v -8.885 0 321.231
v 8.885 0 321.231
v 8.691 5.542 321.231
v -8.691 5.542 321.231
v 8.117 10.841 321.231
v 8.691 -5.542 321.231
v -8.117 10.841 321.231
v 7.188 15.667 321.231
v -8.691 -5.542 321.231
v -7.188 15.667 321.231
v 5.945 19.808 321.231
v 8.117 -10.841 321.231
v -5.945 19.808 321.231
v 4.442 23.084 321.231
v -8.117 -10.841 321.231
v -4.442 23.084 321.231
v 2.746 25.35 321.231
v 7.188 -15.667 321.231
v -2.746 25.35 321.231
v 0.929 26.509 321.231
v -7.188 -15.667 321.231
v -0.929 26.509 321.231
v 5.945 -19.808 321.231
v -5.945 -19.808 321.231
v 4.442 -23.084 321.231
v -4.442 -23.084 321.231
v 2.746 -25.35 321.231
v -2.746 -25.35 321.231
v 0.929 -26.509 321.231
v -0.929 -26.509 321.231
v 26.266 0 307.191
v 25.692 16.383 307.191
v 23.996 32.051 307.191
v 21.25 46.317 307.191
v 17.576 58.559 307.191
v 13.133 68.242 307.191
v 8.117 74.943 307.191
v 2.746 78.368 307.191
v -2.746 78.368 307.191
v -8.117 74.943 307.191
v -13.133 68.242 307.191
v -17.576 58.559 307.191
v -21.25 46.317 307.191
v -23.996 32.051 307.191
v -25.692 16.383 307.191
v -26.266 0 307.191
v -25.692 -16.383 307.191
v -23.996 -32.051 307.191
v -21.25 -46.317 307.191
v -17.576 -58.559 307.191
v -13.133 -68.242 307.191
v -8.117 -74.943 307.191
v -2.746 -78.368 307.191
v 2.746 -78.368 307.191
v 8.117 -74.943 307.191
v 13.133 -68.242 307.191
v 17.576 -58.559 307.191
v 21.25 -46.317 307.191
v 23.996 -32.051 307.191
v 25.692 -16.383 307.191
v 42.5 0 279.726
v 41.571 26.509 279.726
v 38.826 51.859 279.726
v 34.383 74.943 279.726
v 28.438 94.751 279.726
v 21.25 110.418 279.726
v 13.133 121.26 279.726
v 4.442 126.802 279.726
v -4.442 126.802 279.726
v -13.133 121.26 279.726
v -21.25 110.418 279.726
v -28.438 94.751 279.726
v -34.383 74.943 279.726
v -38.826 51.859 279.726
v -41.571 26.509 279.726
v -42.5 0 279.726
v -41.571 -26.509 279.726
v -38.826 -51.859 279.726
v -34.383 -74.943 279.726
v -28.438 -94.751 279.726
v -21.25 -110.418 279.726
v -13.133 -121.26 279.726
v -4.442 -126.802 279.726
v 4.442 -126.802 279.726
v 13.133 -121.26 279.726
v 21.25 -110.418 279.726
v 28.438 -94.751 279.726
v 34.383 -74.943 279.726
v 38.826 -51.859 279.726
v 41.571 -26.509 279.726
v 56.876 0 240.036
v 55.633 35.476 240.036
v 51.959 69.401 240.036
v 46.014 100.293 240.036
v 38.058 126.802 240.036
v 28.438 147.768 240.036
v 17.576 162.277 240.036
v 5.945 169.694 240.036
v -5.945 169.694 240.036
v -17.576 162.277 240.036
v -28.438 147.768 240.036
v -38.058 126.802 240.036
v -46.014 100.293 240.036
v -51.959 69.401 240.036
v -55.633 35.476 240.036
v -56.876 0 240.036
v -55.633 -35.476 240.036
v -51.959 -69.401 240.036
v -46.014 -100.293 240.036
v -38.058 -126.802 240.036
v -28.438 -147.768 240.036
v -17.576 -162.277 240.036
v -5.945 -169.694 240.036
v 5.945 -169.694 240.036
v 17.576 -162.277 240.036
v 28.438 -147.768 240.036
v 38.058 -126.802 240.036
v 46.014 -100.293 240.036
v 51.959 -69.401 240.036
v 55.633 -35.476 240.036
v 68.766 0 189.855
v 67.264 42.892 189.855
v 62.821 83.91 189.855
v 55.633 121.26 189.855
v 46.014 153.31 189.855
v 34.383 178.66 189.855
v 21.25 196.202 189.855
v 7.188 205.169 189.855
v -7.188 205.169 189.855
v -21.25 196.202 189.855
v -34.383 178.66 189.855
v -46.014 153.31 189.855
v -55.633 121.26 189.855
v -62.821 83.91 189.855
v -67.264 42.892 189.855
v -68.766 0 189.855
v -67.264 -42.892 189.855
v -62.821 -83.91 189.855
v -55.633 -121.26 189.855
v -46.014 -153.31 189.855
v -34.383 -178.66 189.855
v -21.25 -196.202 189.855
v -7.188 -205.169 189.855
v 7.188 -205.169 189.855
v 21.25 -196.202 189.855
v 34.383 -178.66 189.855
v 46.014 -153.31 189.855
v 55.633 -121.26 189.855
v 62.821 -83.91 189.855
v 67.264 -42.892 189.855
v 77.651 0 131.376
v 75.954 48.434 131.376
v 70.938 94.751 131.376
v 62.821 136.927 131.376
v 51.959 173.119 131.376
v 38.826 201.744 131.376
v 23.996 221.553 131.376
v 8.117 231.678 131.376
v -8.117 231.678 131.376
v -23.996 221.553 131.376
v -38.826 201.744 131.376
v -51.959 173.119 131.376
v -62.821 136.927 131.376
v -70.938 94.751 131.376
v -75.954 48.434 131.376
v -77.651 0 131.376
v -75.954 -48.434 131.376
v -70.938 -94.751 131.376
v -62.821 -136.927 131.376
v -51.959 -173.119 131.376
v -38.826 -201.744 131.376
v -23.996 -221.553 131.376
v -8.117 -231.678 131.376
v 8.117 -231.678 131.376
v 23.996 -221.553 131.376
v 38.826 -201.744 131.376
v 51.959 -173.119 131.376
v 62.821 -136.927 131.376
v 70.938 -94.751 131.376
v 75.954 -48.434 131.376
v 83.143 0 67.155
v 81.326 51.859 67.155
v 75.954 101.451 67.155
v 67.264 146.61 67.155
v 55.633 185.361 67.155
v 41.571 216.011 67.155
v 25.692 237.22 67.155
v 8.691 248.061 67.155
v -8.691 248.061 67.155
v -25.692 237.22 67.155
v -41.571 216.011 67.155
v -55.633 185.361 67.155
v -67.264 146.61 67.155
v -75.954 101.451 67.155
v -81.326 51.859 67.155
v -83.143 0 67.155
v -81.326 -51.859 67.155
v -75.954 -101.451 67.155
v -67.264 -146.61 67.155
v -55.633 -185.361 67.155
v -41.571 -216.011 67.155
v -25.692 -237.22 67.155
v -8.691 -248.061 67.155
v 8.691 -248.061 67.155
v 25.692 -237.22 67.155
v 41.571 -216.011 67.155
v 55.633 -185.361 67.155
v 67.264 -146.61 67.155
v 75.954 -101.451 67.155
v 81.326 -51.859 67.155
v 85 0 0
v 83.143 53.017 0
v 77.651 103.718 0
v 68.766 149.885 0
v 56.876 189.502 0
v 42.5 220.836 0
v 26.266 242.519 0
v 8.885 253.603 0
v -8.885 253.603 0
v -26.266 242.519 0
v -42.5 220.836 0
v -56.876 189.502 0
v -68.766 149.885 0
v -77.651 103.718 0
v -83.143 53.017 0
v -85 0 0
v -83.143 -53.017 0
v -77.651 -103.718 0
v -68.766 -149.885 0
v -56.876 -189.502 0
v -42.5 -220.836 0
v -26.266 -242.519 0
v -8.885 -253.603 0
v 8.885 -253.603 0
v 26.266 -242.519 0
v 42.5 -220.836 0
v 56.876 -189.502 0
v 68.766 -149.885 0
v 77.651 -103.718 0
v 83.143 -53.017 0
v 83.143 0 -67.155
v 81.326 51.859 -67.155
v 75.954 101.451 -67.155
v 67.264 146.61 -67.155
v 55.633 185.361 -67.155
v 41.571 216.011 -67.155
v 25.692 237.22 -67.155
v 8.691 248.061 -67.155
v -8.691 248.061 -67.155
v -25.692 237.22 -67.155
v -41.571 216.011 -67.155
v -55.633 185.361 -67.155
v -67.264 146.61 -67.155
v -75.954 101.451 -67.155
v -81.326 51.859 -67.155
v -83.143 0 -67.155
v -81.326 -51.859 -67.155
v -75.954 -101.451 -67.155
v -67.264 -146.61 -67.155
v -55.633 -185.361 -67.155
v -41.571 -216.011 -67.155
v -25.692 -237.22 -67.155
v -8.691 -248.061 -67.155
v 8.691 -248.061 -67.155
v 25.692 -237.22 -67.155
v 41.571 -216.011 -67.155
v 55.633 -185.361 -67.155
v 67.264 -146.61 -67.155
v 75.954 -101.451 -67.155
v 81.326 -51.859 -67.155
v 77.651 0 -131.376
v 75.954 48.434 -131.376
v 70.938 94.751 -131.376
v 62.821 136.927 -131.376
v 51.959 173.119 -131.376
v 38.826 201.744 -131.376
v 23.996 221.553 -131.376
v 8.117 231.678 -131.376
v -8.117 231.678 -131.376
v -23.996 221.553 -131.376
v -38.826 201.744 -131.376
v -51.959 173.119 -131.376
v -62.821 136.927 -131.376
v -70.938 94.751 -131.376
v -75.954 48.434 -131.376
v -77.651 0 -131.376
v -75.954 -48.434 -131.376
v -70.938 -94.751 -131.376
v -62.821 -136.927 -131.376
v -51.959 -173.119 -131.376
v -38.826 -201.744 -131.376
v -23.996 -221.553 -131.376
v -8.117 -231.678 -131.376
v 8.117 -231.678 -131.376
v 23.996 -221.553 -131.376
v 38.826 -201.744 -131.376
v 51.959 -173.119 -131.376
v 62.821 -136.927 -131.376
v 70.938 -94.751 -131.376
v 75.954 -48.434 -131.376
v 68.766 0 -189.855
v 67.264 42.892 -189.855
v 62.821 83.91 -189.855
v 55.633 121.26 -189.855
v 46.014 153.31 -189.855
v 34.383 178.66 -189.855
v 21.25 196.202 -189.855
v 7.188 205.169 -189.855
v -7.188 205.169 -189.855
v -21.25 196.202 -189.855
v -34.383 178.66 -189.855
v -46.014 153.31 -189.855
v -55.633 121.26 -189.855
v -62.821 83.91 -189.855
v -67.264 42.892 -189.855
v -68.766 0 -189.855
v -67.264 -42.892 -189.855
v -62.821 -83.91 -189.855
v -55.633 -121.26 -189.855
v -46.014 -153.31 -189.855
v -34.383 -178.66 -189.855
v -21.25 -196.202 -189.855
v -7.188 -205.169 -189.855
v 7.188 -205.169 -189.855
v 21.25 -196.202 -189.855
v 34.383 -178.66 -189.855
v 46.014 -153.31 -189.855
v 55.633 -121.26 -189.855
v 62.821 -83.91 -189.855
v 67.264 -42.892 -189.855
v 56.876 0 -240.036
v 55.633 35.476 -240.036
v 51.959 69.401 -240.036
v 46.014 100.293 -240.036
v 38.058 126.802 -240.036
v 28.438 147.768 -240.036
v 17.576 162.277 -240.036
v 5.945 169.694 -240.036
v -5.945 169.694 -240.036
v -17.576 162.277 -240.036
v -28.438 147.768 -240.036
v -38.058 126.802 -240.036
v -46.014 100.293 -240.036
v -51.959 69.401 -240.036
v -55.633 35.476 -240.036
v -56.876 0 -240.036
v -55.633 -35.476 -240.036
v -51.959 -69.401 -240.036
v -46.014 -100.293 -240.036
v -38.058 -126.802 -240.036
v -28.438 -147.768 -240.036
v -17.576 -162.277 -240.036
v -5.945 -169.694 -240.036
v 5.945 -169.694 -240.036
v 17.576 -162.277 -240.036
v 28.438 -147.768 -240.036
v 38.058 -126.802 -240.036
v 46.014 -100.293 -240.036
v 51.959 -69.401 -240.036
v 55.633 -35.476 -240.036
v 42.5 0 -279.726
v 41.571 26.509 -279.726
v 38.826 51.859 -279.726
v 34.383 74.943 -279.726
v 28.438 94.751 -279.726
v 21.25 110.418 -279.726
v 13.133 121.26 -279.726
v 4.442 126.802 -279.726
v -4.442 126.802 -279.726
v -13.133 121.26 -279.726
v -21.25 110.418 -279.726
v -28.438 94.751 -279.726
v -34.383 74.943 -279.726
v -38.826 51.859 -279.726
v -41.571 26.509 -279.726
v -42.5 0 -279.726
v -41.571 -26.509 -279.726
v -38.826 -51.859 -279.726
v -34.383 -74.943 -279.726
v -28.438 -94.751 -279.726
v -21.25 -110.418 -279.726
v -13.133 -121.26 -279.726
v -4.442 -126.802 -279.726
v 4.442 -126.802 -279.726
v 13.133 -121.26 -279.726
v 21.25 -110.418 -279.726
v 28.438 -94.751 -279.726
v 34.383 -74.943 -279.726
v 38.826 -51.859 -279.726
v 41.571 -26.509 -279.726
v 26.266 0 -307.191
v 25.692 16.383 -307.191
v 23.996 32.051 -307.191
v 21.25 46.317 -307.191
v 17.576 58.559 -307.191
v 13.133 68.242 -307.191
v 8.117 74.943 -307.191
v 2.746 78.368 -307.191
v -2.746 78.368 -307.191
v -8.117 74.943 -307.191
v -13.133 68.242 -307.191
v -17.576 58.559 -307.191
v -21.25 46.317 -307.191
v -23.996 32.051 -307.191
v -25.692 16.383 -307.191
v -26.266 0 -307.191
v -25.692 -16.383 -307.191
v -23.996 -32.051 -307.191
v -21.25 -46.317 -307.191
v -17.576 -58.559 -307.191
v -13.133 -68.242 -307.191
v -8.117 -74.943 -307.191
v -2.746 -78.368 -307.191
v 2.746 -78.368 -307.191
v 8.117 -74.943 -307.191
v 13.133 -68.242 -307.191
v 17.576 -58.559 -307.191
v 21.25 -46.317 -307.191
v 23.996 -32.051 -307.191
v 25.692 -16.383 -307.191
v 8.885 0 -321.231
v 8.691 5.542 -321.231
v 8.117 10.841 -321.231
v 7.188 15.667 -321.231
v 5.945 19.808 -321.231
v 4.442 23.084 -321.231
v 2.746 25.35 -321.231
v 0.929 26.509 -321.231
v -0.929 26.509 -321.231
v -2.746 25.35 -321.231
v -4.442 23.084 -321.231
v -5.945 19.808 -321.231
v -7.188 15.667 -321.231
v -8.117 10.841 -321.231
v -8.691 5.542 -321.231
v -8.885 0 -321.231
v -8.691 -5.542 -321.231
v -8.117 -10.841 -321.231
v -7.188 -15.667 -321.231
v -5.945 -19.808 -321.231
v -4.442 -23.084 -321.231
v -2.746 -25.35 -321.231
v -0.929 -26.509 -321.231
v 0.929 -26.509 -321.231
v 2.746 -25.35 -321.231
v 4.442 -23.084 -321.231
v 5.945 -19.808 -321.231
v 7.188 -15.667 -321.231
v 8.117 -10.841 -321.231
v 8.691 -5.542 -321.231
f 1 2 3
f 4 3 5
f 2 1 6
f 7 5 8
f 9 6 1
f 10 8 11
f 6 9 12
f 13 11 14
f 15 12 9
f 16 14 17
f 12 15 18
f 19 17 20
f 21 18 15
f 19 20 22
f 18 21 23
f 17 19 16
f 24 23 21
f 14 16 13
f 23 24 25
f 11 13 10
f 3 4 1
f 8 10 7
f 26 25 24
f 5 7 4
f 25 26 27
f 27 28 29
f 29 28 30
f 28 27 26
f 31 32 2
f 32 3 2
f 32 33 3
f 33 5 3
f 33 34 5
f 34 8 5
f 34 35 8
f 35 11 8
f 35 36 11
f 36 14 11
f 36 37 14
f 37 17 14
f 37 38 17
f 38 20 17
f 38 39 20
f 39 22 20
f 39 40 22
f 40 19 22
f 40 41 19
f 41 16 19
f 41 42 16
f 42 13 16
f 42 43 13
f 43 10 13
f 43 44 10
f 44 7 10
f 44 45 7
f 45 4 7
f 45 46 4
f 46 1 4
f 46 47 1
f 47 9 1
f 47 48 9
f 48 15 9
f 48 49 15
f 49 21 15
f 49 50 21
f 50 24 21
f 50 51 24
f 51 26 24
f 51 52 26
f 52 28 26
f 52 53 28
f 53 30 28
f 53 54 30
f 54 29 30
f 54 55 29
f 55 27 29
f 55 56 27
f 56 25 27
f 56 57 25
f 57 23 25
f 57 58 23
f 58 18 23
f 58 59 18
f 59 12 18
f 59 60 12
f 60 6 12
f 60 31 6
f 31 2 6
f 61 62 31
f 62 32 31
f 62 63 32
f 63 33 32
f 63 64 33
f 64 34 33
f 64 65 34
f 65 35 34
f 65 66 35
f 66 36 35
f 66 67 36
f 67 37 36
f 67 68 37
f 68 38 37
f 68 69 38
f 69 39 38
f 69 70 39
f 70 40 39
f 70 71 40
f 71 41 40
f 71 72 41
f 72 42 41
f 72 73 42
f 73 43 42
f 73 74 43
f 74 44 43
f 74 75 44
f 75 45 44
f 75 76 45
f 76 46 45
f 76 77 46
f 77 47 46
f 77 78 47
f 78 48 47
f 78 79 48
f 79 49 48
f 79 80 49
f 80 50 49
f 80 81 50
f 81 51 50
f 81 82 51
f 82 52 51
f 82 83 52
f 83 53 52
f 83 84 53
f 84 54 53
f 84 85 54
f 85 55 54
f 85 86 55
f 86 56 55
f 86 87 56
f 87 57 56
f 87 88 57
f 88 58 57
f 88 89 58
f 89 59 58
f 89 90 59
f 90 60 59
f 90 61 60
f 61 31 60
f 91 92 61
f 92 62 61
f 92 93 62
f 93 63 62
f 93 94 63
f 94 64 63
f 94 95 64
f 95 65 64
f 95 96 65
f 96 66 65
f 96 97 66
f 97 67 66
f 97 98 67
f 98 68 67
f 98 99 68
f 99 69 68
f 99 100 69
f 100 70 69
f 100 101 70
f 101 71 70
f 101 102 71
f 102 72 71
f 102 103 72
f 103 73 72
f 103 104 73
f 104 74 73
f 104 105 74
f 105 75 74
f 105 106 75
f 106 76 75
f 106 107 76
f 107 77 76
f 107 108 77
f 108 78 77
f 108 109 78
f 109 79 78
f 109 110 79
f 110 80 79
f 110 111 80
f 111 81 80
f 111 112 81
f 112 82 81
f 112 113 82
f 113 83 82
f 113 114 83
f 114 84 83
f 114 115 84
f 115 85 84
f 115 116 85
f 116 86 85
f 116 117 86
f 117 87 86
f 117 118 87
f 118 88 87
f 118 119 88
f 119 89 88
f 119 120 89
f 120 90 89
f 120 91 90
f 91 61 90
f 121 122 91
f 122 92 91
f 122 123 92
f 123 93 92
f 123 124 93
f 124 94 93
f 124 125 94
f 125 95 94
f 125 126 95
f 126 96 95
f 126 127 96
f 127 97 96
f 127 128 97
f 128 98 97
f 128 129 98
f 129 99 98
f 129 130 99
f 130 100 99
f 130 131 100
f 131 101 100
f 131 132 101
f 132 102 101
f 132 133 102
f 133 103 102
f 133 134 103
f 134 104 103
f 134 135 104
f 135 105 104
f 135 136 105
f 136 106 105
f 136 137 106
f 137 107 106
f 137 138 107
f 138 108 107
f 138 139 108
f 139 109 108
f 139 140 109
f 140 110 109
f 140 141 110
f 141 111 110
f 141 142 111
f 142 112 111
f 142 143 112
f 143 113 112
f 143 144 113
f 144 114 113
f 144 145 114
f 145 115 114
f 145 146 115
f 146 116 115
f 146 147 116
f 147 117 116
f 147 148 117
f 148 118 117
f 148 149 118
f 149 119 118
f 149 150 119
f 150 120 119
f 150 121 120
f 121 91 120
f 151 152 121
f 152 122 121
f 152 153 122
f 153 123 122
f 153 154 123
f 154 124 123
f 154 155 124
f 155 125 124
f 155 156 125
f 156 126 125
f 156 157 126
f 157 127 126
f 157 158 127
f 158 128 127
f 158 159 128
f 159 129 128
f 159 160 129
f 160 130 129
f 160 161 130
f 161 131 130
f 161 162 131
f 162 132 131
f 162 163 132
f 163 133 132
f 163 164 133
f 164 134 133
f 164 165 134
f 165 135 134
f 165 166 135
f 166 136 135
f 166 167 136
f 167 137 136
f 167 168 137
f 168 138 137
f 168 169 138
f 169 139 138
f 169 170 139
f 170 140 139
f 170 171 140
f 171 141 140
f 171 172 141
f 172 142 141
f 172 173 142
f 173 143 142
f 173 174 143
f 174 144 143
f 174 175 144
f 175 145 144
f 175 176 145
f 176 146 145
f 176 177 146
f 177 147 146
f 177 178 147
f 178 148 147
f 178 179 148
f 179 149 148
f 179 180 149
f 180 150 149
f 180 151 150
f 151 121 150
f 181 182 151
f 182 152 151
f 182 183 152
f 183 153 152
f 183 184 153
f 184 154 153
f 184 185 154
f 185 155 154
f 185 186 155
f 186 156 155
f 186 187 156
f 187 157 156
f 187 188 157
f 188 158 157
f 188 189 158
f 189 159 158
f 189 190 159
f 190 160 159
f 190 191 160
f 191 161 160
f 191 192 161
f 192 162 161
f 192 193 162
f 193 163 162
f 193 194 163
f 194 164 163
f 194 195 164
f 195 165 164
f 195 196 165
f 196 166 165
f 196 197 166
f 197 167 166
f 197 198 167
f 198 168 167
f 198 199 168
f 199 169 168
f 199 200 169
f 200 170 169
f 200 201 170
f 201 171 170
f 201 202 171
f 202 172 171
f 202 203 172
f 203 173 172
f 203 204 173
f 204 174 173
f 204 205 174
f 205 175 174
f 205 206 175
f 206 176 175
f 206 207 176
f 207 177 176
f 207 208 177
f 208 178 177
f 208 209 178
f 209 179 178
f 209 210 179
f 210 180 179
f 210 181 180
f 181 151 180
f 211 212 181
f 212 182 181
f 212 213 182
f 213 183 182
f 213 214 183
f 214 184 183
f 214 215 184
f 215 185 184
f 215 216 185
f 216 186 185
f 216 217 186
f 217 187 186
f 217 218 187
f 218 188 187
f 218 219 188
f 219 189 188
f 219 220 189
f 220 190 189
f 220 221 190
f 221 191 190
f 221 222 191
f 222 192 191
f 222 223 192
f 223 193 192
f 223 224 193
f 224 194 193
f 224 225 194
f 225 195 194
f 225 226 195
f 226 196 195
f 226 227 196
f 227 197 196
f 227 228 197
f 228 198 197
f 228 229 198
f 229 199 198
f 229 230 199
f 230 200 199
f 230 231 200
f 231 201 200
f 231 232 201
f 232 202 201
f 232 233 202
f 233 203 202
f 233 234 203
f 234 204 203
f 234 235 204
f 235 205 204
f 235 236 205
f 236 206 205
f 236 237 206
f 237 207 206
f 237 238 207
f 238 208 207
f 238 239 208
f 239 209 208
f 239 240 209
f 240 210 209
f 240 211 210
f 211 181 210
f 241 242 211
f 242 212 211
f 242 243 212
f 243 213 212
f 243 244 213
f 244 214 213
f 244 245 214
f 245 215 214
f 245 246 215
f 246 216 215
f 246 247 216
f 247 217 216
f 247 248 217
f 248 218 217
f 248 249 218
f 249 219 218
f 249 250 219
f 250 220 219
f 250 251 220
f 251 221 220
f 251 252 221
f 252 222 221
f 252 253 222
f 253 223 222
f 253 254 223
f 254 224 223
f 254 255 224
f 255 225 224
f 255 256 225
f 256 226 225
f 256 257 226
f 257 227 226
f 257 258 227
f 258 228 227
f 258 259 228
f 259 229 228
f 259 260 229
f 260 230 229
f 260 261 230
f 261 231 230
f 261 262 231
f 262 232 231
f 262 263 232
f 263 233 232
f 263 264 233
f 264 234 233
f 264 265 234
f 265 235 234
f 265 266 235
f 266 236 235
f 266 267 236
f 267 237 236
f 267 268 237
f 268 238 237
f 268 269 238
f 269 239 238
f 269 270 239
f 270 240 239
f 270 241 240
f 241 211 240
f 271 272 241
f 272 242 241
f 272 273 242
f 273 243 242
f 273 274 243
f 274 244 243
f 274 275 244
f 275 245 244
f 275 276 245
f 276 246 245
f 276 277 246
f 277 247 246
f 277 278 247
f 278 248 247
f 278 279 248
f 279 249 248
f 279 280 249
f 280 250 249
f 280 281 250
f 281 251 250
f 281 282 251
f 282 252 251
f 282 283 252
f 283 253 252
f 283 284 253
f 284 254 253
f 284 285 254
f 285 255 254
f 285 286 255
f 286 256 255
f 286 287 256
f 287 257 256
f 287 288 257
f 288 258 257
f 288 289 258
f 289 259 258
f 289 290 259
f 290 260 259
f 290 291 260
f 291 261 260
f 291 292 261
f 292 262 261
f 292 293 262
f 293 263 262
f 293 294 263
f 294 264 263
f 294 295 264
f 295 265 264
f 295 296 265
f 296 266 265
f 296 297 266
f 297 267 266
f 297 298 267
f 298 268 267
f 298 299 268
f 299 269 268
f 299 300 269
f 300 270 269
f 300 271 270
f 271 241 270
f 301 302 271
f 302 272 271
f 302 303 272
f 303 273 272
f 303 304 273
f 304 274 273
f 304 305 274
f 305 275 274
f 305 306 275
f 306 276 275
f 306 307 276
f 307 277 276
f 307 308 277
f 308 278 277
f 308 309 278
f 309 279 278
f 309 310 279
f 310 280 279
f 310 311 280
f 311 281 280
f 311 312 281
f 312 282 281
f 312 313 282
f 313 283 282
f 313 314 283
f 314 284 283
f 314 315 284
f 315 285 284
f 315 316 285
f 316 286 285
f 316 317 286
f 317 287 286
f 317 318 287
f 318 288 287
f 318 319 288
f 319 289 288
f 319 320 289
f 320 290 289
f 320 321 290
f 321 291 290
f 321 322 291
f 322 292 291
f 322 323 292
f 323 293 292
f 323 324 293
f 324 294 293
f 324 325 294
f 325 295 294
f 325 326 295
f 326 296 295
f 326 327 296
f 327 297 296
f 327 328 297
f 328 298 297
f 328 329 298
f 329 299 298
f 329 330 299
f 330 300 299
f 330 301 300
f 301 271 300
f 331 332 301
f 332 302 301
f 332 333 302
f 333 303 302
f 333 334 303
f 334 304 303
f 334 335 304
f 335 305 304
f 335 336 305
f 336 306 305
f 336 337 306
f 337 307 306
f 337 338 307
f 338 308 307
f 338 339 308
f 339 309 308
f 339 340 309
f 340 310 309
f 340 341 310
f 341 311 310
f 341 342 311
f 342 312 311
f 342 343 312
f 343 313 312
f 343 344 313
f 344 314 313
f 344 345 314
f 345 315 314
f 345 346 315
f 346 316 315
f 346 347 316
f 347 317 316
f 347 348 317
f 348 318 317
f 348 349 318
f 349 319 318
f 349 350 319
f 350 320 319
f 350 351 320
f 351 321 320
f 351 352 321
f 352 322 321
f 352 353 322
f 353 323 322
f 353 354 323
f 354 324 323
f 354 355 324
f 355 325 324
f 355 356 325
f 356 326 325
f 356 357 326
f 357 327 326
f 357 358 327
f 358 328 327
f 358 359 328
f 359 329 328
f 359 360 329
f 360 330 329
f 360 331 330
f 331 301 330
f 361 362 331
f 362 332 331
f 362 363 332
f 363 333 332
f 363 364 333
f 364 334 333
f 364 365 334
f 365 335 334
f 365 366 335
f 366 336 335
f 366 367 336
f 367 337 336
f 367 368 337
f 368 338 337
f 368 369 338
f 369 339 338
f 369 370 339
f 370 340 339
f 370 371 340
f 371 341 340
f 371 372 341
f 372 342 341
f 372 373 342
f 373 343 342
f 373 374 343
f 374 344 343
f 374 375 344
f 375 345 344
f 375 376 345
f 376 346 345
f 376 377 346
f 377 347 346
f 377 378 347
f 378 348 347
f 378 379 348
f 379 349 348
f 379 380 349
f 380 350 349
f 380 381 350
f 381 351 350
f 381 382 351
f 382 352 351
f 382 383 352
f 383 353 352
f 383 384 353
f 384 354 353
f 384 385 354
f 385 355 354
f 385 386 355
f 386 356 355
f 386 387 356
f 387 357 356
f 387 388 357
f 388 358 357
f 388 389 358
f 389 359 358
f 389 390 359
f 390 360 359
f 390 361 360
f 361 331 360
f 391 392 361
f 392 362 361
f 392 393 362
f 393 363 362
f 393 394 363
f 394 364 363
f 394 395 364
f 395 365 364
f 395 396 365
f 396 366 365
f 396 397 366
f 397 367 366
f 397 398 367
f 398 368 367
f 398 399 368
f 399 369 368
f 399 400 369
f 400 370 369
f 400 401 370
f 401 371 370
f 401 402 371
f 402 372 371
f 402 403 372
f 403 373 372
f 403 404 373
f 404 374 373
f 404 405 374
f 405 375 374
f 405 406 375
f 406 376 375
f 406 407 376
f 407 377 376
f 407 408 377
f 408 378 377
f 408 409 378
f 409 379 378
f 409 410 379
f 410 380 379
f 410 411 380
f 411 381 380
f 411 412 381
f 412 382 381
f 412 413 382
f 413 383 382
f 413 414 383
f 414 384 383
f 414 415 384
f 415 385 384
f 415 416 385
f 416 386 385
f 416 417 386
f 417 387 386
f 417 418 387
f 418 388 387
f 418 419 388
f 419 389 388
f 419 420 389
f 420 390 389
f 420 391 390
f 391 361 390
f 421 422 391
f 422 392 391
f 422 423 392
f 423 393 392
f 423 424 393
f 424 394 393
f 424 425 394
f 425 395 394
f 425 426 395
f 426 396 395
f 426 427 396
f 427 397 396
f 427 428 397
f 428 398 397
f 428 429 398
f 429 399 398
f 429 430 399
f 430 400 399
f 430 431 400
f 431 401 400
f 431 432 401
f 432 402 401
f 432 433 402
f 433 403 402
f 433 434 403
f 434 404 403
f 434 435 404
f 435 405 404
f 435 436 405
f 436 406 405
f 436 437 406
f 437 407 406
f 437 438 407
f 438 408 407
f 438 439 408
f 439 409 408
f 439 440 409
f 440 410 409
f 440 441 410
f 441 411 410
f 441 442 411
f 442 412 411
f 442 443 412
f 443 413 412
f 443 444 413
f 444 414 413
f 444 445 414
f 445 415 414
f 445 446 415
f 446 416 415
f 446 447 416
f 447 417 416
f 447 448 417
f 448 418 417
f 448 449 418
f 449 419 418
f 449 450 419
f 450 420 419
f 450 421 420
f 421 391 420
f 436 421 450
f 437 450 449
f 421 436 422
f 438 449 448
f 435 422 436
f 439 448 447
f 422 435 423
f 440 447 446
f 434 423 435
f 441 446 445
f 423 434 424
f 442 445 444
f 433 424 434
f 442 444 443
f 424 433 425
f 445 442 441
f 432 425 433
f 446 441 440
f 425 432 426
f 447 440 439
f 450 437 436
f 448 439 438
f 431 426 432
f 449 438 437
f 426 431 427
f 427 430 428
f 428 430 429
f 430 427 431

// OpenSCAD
// Generated by SolidPython 1.0.1 on 2020-07-29 00:46:46


scale(v = [5, 15, 19]) {
	sphere(r = 17);
}
/***********************************************
*********      SolidPython code:      **********
************************************************
 
# import packages: SolidPython
from solid import *
from solid.utils import *
from itertools import chain, combinations, permutations


class Resize:

    def __init__(self, scad_file):
        self.scad_file = scad_file
        #self.scad_file = import_scad(scad_file)
        # cone/cylinder param:
        self.r1 = 0
        self.r2 = 0
        self.h = 0
        # rectangular prism param:
        self.w = 0
        self.l = 0
        # ellipse param:
        self.r = 0

    # import OpenScad code (file name corresponds to shape)


    # classify shape + parameters
    def assign(self, param1, param2, param3):
        if self.scad_file == 'cone.scad':
            self.r1 = param1
            self.r2 = param2
            self.h = param3
        elif self.scad_file == 'cylinder.scad':
            self.r1 = param1
            self.r2 = param2
            self.h = param3
        elif self.scad_file == 'rectangularPrism.scad':
            self.h = param1
            self.l = param2
            self.w = param3
        else:
            self.r = param1
            self.h = param2

    # resize parameters
    def iterate(self):
        x = range(3, 20, 2)
        i = 1
        if self.scad_file == 'cone.scad':
            tempList = list(permutations(x, 2))
            for temp in tempList:
                param1 = temp[0]
                param2 = temp[1]
                filepath = 'produced_scad_files/' + 'cone' + str(param1) + '_' + str(param2) + '_' + '.scad'
                scad_render_to_file(cylinder(h=param1, r1=param2, r2=0), filepath)

        elif self.scad_file == 'cylinder.scad':
            tempList = list(permutations(x, 3))
            for temp in tempList:
                param1 = temp[0]
                param2 = temp[1]
                filepath = 'produced_scad_files/' + 'cylinder' + str(param1) + '_' + str(param2) + '_' + '.scad'
                scad_render_to_file(cylinder(h=param1, r1=param2, r2=param2), filepath)

        elif self.scad_file == 'rectangularPrism.scad':
            tempList = list(permutations(x, 3))
            for temp in tempList:
                param1 = temp[0]
                param2 = temp[1]
                param3 = temp[2]
                filepath = 'produced_scad_files/' + 'rectangularPrism' + str(param1) + '_' + str(param2) + '_' + str(
                    param3) + '.scad'
                scad_render_to_file(cube(size=(param1, param2, param3)), filepath)

        elif self.scad_file == 'ellipse.scad':
            tempList = list(permutations(x, 4))
            for temp in tempList:
                param1 = temp[0]
                param2 = temp[1]
                param3 = temp[2]
                param4 = temp[3]
                filepath = 'produced_scad_files/' + 'ellipse' + str(param1) + '_' + str(param2) + '_' + str(param3) + '_' + str(param4) + '.scad'
                scad_render_to_file(scale([param1, param2, param3])(sphere(r=param4)), filepath)

    def render_to_scadfile(self):
        scad_render_to_file(scad, 'example.scad') 
 
************************************************/
